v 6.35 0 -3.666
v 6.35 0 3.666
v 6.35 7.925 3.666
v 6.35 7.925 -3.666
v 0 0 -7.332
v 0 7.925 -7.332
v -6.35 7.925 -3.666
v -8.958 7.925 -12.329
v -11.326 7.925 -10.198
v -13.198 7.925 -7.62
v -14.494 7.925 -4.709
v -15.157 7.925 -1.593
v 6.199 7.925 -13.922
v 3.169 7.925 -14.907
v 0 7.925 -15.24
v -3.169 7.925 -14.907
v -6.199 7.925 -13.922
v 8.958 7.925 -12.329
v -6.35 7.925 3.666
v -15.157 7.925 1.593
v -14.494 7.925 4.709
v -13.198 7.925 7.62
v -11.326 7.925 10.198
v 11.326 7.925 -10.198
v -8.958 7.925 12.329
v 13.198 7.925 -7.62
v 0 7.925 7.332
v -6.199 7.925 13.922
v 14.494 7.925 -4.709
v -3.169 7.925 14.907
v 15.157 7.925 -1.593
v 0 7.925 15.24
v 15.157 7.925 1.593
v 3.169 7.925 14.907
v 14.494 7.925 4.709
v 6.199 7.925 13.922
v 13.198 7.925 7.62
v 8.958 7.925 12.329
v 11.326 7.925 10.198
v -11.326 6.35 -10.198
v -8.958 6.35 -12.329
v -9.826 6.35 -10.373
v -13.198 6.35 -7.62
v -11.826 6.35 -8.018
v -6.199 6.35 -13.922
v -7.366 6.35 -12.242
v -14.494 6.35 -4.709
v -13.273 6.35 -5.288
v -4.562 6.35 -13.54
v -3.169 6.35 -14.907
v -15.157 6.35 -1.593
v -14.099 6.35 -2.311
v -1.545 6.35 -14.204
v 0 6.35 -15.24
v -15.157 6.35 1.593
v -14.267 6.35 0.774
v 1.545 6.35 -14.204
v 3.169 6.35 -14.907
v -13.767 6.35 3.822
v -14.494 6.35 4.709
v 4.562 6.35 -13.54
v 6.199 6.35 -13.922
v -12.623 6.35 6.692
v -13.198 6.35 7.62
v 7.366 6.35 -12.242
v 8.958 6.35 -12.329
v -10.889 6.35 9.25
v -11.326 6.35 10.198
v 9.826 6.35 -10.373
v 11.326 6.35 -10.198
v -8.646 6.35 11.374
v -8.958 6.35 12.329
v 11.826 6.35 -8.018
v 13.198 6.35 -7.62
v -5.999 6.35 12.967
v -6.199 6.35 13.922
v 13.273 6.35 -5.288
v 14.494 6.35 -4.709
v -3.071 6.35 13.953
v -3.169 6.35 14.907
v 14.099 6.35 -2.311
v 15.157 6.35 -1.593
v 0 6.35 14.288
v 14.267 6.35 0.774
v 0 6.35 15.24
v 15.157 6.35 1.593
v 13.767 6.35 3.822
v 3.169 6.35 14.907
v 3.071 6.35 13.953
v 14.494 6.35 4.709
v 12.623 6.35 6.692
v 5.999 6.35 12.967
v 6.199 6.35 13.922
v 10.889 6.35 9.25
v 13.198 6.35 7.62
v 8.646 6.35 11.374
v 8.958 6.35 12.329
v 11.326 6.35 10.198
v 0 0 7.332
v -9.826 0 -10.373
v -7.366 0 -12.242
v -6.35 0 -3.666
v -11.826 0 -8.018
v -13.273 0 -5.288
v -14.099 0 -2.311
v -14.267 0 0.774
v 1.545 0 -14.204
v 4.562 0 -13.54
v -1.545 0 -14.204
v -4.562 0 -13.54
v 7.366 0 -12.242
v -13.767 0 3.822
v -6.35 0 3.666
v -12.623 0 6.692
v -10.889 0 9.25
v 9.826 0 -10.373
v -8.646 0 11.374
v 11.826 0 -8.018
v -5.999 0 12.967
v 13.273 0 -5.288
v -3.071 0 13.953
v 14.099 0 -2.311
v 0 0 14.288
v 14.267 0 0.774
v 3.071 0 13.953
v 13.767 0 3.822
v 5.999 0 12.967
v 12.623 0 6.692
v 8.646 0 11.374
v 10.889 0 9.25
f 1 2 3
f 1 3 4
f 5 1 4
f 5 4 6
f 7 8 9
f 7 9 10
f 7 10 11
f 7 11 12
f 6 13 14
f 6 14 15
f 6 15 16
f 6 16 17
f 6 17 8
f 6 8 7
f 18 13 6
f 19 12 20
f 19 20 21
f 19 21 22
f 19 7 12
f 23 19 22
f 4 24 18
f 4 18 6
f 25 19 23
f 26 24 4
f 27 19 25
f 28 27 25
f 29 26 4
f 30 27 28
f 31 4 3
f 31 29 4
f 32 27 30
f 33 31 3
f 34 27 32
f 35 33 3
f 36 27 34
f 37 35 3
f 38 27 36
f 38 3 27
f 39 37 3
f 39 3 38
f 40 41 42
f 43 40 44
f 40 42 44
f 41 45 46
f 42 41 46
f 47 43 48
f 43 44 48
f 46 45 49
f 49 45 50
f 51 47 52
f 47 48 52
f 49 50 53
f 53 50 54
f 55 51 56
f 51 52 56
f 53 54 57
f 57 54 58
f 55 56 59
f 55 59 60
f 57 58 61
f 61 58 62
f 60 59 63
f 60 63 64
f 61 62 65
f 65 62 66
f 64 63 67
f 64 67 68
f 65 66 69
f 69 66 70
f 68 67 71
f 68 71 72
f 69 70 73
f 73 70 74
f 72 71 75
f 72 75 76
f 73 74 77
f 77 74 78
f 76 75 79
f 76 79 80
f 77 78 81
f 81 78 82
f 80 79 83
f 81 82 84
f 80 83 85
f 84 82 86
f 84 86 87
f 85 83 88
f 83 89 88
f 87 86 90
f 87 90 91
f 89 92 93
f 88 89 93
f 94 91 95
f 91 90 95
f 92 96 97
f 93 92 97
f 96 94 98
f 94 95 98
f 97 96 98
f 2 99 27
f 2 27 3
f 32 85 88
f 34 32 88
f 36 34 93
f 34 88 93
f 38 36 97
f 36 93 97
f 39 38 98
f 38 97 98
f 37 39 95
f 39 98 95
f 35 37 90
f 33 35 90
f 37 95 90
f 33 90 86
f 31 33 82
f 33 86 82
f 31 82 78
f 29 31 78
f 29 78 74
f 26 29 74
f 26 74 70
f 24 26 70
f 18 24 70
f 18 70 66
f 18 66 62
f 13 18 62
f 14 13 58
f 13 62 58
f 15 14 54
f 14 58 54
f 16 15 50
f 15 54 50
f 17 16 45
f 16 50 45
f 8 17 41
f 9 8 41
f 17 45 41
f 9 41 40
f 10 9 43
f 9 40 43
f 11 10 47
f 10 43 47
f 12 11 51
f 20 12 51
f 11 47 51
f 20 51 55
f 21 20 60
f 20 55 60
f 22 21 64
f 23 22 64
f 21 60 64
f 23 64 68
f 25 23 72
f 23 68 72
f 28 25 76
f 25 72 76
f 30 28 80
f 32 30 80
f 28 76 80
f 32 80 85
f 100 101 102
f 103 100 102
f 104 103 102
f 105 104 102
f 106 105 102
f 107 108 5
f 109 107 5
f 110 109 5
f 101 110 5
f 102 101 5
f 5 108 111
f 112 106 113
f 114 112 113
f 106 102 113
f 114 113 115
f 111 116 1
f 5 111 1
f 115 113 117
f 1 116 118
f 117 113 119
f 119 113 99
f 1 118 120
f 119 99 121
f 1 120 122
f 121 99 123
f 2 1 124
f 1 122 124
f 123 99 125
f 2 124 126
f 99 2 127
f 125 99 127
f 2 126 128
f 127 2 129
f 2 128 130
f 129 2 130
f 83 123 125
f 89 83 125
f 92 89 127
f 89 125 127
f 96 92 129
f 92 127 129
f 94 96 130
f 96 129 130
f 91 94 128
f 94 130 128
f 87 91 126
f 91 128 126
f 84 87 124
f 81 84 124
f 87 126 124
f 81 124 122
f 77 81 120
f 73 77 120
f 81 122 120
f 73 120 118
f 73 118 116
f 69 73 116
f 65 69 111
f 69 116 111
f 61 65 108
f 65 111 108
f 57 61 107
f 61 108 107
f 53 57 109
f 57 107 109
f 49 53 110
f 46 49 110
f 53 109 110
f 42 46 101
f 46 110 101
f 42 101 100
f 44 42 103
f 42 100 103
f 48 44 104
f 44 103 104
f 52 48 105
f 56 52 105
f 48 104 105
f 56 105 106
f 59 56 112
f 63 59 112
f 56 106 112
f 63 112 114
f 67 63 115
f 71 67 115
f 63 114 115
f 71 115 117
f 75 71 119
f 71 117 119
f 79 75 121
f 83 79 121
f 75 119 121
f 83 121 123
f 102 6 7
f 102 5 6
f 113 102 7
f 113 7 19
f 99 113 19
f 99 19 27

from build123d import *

# Parameters (mm, degrees)
SKETCH1_R           = 14.2875
BOSS_EXTRUDE1_DEPTH = 6.35
SKETCH2_R           = 15.24
BOSS_EXTRUDE2_DEPTH = 1.5748


with BuildPart() as part:
    # Sketch1 → Boss-Extrude1 (new body)
    with BuildSketch(Plane(origin=(0, 0, 0), x_dir=(1, 0, 0), z_dir=(0, 1, 0))):
        with Locations(Location((0, 0, 0), (0, 0, 270))):
            Circle(SKETCH1_R)
        Polygon((0, -7.332348419), (6.35, -3.666174209), (6.35, 3.666174209), (0, 7.332348419), (-6.35, 3.666174209), (-6.35, -3.666174209), align=None, mode=Mode.SUBTRACT)
    extrude(amount=BOSS_EXTRUDE1_DEPTH)

    # Sketch2 → Boss-Extrude2 (add)
    with BuildSketch(Plane(origin=(0, 6.35, 0), x_dir=(1, 0, 0), z_dir=(0, 1, 0))):
        with Locations(Location((0, 0, 0), (0, 0, 270))):
            Circle(SKETCH2_R)
        Polygon((0, 7.332348419), (-6.35, 3.666174209), (-6.35, -3.666174209), (0, -7.332348419), (6.35, -3.666174209), (6.35, 3.666174209), align=None, mode=Mode.SUBTRACT)
    extrude(amount=BOSS_EXTRUDE2_DEPTH)


solid = part.part
